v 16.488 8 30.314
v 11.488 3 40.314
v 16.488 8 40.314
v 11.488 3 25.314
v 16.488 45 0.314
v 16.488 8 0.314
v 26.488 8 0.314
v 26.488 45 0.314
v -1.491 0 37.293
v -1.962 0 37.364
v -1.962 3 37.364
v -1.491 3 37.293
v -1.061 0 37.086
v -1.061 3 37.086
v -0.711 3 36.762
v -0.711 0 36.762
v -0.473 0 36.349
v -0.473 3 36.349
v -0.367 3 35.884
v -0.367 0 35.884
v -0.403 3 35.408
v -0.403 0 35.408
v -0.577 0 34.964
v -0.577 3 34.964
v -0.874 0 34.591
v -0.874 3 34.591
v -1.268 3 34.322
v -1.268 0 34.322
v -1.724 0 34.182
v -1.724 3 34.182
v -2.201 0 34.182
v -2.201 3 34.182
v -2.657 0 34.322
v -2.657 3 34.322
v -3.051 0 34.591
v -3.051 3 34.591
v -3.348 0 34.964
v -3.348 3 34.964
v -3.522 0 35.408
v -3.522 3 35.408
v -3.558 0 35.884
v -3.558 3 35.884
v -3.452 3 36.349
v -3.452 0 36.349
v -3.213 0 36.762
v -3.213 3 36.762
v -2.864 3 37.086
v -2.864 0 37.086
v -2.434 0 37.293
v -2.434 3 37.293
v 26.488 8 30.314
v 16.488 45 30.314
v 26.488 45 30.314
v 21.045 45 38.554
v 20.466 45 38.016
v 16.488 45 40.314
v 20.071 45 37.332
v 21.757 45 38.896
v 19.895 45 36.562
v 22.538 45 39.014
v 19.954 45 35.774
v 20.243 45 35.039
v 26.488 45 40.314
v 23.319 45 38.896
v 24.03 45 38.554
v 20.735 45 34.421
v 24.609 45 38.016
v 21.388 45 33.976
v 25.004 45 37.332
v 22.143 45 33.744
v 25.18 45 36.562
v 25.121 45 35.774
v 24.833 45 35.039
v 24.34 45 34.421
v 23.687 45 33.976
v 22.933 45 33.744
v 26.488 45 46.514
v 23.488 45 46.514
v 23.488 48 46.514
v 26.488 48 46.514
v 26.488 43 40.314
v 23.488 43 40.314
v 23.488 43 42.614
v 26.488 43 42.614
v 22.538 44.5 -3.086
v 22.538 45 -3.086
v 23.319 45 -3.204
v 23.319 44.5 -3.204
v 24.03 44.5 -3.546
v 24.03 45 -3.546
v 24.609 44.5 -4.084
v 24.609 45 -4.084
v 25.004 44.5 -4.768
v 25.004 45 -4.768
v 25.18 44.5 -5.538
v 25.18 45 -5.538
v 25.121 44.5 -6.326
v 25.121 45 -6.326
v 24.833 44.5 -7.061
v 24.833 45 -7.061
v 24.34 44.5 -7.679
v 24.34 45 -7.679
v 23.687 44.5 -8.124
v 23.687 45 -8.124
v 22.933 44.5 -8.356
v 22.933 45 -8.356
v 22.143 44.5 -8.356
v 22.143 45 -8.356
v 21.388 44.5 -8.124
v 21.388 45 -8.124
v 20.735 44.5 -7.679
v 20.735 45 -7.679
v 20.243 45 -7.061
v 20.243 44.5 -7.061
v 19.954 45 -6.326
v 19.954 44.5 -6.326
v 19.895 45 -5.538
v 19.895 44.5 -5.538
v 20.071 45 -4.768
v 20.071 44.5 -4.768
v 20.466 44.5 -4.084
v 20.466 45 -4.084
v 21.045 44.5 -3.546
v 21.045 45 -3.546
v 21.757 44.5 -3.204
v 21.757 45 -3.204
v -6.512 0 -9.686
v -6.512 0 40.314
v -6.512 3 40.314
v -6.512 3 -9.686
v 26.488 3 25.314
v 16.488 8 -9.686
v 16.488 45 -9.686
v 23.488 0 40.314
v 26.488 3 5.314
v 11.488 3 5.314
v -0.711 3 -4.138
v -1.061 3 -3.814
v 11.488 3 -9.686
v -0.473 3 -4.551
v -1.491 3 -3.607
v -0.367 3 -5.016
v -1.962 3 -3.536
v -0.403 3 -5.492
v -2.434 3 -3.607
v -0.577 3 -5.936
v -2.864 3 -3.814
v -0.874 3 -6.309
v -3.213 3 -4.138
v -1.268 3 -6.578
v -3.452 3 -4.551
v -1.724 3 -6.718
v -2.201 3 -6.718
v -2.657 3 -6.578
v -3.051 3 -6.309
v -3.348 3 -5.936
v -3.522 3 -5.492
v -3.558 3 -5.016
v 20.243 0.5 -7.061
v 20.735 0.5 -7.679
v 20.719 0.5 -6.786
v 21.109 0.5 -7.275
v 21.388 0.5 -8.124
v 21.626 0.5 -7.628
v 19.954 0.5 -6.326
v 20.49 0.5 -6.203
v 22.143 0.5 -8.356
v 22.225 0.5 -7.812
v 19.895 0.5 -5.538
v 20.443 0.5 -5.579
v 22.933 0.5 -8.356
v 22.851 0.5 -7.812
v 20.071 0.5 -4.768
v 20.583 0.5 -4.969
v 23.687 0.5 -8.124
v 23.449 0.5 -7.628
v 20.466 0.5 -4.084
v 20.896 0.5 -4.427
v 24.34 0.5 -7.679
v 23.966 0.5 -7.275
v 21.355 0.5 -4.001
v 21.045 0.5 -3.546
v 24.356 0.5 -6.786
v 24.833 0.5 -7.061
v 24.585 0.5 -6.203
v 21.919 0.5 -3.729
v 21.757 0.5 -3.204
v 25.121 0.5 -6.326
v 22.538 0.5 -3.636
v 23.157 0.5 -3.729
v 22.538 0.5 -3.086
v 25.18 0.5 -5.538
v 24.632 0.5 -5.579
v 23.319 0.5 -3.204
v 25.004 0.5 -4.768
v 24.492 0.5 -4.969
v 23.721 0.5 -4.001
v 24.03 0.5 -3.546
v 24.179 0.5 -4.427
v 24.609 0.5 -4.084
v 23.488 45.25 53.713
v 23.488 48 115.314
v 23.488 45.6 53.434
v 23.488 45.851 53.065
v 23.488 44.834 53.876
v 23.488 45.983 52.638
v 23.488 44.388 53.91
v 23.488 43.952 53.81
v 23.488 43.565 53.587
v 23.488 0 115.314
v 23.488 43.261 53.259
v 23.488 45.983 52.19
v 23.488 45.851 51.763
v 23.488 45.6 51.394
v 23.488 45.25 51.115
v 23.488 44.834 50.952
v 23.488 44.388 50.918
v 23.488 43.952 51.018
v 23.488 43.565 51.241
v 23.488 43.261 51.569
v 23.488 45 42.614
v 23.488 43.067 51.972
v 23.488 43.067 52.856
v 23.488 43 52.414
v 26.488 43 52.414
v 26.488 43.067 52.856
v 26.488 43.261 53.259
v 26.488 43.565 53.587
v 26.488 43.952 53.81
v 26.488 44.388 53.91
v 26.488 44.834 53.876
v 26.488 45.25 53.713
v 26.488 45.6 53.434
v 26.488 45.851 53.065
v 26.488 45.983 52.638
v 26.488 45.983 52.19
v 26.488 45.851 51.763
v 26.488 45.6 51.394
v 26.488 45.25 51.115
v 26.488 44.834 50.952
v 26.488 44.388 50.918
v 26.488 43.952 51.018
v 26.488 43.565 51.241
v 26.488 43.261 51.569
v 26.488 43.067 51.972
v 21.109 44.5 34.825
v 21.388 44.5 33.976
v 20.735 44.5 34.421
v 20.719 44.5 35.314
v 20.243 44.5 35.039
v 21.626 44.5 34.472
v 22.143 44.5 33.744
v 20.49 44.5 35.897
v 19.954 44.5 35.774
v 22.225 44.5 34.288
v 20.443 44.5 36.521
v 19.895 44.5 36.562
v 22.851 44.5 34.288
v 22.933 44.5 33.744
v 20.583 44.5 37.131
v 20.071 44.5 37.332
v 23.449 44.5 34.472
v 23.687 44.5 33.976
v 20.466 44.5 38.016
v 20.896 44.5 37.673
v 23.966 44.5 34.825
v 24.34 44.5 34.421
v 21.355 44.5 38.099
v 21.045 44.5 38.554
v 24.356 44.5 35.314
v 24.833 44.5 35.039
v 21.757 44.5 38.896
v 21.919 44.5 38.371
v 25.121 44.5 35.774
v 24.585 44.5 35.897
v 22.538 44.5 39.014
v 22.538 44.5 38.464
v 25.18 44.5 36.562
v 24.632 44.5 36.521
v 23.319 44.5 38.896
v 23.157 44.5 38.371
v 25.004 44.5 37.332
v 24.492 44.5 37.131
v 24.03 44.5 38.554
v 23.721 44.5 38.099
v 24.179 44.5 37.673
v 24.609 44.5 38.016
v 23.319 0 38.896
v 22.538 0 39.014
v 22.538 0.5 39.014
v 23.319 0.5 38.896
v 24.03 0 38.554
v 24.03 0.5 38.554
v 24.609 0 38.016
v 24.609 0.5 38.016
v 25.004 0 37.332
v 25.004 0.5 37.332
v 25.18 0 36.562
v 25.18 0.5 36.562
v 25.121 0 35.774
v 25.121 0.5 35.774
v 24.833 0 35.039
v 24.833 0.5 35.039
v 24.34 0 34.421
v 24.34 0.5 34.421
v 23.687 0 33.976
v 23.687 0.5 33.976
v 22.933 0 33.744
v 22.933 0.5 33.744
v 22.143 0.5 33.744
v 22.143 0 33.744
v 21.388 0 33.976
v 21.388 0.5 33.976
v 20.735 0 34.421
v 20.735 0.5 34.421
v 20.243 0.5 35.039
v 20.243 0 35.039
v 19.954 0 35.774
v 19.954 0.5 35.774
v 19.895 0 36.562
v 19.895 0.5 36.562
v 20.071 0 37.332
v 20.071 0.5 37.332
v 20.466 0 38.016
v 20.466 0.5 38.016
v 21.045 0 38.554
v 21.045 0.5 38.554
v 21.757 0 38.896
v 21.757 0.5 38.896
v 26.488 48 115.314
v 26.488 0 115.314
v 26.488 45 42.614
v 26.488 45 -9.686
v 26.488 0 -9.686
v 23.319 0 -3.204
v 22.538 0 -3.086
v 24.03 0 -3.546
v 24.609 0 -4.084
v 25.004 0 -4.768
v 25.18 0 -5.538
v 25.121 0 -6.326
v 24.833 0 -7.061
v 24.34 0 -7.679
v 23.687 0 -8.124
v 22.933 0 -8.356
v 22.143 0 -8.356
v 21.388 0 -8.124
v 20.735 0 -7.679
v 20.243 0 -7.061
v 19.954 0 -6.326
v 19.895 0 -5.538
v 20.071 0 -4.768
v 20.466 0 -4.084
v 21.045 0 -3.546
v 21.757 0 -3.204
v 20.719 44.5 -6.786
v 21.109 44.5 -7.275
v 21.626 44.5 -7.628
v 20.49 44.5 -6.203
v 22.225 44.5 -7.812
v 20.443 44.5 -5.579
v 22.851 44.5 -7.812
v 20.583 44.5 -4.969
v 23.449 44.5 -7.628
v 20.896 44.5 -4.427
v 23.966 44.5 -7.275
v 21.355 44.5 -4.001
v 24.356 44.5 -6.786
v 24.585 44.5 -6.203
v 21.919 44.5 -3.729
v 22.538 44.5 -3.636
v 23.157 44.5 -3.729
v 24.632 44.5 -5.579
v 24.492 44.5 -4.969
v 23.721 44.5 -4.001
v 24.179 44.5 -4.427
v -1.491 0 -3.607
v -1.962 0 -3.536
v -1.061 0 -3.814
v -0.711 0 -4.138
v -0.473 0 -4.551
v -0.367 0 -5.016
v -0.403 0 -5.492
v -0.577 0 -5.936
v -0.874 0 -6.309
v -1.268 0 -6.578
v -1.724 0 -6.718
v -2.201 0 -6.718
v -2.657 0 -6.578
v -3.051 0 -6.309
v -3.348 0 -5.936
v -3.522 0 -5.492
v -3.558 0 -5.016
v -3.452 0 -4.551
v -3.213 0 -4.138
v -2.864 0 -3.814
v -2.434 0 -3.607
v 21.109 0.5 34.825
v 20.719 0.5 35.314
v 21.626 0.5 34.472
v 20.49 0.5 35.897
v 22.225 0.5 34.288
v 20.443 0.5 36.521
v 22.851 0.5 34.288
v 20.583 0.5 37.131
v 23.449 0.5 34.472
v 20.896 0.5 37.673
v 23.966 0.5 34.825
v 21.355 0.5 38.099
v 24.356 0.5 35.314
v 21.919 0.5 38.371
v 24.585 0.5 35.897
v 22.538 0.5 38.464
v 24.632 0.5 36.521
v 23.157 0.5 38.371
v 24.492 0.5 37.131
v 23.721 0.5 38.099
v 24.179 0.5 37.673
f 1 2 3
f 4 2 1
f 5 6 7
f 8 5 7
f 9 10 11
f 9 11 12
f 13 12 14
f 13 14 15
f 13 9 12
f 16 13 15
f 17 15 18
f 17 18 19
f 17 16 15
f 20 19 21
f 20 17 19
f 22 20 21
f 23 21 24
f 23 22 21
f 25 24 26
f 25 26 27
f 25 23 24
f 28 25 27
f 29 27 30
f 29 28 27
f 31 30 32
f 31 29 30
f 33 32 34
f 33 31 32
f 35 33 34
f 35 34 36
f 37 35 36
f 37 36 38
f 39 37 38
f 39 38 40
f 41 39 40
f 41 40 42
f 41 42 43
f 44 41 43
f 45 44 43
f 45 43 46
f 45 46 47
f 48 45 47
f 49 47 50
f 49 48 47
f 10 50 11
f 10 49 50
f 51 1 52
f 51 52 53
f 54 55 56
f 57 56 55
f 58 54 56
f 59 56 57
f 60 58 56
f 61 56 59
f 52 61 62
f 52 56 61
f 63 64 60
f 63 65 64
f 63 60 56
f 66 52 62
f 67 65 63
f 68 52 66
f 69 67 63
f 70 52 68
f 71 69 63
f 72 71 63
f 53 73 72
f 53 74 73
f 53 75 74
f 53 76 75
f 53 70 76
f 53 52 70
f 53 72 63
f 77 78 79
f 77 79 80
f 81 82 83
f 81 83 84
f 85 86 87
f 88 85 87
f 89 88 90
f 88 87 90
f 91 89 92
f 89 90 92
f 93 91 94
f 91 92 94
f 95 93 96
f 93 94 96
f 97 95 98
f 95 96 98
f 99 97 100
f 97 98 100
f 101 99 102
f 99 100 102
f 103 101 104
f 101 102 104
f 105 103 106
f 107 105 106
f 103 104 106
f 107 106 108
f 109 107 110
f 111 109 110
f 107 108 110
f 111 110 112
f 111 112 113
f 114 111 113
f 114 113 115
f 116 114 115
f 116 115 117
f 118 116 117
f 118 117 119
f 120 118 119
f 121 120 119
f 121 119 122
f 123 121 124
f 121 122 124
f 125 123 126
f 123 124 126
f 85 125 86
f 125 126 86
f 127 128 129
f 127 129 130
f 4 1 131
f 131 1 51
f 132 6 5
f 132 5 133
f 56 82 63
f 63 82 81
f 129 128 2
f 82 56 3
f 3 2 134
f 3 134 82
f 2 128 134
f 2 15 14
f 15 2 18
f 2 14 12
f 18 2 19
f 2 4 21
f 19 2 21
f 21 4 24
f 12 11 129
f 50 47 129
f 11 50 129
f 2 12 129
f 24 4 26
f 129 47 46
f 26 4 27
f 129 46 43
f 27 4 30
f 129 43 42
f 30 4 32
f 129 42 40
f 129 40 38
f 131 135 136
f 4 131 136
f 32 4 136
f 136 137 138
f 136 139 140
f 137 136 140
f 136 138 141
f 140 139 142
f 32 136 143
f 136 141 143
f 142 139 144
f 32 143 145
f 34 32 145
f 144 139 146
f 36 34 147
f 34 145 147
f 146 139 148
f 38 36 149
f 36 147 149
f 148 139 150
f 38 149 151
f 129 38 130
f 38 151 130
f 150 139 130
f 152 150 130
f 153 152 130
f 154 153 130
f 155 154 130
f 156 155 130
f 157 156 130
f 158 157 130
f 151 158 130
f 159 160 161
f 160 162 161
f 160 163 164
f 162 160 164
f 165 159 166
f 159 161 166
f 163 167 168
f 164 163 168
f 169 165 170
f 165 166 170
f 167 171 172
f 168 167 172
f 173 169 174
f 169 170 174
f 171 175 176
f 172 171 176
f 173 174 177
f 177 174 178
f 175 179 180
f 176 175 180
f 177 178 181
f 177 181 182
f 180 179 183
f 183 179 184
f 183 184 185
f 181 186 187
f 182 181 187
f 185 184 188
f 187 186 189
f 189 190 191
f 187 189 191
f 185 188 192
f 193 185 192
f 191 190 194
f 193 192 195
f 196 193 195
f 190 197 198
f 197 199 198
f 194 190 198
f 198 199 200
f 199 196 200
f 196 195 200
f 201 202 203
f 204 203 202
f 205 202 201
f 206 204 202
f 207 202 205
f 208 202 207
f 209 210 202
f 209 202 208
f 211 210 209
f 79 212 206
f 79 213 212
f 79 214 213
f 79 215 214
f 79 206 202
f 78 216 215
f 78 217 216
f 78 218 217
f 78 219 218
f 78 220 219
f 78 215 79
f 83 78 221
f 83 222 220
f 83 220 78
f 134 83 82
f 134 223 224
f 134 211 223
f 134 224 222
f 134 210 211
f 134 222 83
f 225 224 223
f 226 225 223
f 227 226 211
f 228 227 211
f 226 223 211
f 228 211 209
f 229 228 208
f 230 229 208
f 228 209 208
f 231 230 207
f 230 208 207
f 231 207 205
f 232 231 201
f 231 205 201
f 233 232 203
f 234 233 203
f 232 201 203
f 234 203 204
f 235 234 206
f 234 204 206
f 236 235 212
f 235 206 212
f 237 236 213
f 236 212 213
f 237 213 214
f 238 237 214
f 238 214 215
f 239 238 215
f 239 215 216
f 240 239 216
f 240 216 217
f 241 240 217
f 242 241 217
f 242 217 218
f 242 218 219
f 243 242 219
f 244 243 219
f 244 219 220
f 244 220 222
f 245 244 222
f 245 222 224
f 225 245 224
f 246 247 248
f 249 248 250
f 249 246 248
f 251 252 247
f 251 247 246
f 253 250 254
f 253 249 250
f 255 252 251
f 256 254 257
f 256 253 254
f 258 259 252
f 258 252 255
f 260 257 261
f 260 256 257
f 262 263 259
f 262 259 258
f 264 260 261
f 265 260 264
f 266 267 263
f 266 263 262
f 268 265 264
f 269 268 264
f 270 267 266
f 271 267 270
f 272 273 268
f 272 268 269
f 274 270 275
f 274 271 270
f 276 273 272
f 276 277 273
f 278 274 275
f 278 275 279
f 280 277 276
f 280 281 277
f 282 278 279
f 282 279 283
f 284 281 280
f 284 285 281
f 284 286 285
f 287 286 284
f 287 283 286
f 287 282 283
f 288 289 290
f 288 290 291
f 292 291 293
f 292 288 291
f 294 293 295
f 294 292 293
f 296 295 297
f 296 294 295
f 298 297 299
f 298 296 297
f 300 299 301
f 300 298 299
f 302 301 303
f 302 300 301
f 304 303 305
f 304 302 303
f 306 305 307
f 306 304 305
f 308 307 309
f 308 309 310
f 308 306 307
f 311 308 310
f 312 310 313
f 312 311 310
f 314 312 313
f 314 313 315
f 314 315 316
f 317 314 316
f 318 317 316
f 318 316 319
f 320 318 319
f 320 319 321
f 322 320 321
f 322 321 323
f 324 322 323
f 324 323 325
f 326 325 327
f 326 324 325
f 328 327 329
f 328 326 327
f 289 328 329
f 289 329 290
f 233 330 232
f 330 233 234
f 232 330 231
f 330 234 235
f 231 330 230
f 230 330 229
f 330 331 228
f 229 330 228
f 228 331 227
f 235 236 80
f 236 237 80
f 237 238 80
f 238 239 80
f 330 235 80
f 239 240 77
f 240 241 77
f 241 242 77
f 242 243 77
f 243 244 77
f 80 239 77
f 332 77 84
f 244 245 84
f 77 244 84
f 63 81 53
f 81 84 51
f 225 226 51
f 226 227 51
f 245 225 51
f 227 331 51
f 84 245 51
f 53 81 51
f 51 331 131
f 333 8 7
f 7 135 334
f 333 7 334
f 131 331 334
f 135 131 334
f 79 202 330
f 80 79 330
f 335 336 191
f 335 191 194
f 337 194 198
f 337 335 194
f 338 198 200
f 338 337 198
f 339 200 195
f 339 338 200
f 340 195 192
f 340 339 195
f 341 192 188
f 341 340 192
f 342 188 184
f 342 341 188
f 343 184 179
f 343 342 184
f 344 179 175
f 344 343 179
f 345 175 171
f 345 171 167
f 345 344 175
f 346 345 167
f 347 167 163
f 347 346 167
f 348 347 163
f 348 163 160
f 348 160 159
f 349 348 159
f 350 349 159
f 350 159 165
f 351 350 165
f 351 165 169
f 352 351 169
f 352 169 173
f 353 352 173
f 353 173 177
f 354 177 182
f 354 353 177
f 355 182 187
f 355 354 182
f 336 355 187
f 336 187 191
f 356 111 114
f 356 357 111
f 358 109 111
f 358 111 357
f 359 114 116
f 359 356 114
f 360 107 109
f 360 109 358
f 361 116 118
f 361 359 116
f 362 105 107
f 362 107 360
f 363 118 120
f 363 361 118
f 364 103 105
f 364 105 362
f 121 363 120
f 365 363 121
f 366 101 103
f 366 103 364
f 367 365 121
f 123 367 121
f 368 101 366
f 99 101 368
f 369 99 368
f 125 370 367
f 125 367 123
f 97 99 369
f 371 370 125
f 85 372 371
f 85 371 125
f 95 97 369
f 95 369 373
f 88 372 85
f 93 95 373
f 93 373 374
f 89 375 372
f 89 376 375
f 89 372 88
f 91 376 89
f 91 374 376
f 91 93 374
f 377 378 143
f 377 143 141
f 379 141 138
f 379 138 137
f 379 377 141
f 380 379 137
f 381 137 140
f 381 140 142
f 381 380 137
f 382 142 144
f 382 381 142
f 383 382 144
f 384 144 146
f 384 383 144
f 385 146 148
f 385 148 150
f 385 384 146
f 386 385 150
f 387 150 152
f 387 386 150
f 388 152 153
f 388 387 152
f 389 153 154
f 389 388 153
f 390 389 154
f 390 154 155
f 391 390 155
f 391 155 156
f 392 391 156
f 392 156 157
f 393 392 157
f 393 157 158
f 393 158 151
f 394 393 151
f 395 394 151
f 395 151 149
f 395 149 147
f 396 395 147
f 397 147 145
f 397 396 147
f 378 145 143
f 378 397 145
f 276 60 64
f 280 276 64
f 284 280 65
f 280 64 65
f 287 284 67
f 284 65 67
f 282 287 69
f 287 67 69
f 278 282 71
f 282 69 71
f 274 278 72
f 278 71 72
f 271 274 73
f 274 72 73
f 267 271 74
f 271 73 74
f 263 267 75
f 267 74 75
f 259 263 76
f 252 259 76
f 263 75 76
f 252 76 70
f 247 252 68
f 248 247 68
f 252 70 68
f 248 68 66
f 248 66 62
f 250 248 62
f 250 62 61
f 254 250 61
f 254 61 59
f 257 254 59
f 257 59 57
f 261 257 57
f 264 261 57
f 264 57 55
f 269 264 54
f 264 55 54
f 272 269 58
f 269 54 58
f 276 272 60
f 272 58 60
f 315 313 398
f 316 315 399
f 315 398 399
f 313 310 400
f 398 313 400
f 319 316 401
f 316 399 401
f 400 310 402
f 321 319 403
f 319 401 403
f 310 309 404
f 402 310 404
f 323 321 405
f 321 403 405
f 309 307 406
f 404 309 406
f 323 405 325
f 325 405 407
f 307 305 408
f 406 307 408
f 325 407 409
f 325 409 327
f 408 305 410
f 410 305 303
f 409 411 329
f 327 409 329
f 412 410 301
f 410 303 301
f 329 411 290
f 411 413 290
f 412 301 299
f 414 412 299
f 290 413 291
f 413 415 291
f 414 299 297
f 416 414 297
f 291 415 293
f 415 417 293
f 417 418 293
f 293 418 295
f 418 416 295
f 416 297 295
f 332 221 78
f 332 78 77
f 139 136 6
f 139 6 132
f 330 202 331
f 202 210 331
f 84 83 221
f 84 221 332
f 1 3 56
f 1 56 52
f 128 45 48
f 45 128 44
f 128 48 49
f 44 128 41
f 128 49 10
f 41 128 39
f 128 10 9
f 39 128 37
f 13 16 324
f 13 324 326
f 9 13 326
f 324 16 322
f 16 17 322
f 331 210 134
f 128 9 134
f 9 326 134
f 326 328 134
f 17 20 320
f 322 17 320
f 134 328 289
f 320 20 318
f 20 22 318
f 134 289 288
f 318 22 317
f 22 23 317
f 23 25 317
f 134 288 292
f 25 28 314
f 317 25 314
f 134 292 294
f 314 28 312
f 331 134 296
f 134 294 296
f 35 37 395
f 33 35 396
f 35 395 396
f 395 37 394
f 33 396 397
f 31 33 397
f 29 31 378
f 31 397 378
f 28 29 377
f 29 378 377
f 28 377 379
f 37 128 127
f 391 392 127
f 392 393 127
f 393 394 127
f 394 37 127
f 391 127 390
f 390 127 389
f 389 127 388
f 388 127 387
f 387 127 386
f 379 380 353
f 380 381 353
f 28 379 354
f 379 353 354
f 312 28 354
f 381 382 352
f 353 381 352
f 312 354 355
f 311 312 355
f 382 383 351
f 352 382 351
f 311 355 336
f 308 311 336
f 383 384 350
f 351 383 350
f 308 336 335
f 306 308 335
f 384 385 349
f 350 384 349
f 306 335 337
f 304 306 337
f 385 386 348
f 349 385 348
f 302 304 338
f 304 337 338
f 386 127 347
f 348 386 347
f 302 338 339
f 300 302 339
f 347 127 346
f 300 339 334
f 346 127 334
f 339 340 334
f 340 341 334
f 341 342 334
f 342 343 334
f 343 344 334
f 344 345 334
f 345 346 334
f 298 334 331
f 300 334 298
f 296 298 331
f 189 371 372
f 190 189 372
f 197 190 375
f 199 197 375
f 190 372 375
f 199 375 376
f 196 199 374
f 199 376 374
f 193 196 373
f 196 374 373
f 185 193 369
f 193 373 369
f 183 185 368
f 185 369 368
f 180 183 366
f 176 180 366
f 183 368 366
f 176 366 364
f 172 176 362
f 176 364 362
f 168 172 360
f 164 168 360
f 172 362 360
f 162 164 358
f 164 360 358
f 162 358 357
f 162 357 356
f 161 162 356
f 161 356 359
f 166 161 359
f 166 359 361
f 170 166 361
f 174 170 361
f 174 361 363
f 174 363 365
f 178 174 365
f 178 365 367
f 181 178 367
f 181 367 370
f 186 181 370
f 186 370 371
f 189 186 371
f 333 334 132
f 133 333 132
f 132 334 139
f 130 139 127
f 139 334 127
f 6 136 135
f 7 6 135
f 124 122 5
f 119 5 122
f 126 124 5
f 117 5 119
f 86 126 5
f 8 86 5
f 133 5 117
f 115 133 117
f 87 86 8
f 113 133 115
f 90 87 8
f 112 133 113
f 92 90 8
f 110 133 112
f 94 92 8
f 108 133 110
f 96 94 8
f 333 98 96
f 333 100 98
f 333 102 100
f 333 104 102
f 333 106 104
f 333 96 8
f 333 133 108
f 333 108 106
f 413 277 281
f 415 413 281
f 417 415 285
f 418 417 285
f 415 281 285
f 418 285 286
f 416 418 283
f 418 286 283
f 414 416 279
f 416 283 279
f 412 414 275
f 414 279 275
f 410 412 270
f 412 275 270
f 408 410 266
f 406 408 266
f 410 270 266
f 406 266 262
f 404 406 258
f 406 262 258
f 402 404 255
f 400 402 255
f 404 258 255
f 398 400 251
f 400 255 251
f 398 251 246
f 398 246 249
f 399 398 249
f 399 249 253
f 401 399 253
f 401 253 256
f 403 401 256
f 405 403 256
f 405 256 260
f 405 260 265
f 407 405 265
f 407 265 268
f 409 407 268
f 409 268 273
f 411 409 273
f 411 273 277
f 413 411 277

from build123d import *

# Parameters (mm, degrees)
SKETCH1_R           = 1.6
BOSS_EXTRUDE1_DEPTH = 3
SKETCH2_W           = 10
SKETCH2_H           = 10
BOSS_EXTRUDE2_DEPTH = 42
CHAMFER1_SIZE       = 5
SKETCH3_R           = 2.1
CUT_EXTRUDE1_DEPTH  = 52
SKETCH4_R           = 2.65
CUT_EXTRUDE2_DEPTH  = 0.5
SKETCH5_W           = 3
SKETCH5_H           = 43
BOSS_EXTRUDE3_DEPTH = 75
SKETCH6_W           = 3
SKETCH6_H           = 3.9
BOSS_EXTRUDE4_DEPTH = 2
SKETCH7_W           = 3
SKETCH7_H           = 68.8
BOSS_EXTRUDE5_DEPTH = 5
SKETCH8_R           = 1.5
CUT_EXTRUDE3_DEPTH  = 5


with BuildPart() as part:
    # Sketch1 → Boss-Extrude1 (new body)
    with BuildSketch(Plane(origin=(0, 0, 0), x_dir=(1, 0, 0), z_dir=(0, 1, 0))):
        Polygon((-6.512396694, 9.685950413), (1.487603306, 9.685950413), (26.487603306, 9.685950413), (26.487603306, -40.314049587), (1.487603306, -40.314049587), (-6.512396694, -40.314049587), align=None)
        with Locations(Location((-1.962396694, -35.764049587, 0), (0, 0, 270))):
            Circle(SKETCH1_R, mode=Mode.SUBTRACT)
        with Locations(Location((-1.962396694, 5.135950413, 0), (0, 0, 270))):
            Circle(SKETCH1_R, mode=Mode.SUBTRACT)
    extrude(amount=BOSS_EXTRUDE1_DEPTH)

    # Sketch2 → Boss-Extrude2 (add)
    with BuildSketch(Plane(origin=(0, 3, 0), x_dir=(1, 0, 0), z_dir=(0, 1, 0))):
        with Locations((21.487603306, -35.314049587)):
            Rectangle(SKETCH2_W, SKETCH2_H)
        with Locations((21.487603306, 4.685950413)):
            Rectangle(SKETCH2_W, SKETCH2_H)
    extrude(amount=BOSS_EXTRUDE2_DEPTH)

    # Chamfer1
    chamfer1_edges = [part.edges().sort_by_distance(p)[0] for p in [
        (21.487603306, 3, 30.314049587),
        (16.487603306, 3, 35.314049587),
        (16.487603306, 3, -4.685950413),
        (21.487603306, 3, 0.314049587),
    ]]
    chamfer(chamfer1_edges, length=CHAMFER1_SIZE)

    # Sketch3 → Cut-Extrude1 (cut)
    with BuildSketch(Plane(origin=(0, 45, 0), x_dir=(1, 0, 0), z_dir=(0, 1, 0))):
        with Locations(Location((22.537603306, -36.364049587, 0), (0, 0, 270))):
            Circle(SKETCH3_R)
        with Locations(Location((22.537603306, 5.735950413, 0), (0, 0, 270))):
            Circle(SKETCH3_R)
    extrude(amount=-CUT_EXTRUDE1_DEPTH, mode=Mode.SUBTRACT)

    # Sketch4 → Cut-Extrude2 (cut)
    with BuildSketch(Plane(origin=(0, 45, 0), x_dir=(1, 0, 0), z_dir=(0, 1, 0))):
        with Locations(Location((22.537603306, -36.364049587, 0), (0, 0, 270))):
            Circle(SKETCH4_R)
        with Locations(Location((22.537603306, 5.735950413, 0), (0, 0, 270))):
            Circle(SKETCH4_R)
    cut_extrude2 = extrude(amount=-CUT_EXTRUDE2_DEPTH, mode=Mode.SUBTRACT)

    # Mirror1: Cut-Extrude2 across plane
    add(cut_extrude2.mirror(Plane(origin=(0, 22.5, 0), x_dir=(0, 0, 1), z_dir=(0, -1, 0))), mode=Mode.SUBTRACT)

    # Sketch5 → Boss-Extrude3 (add)
    with BuildSketch(Plane.XY.offset(40.314049587)):
        with Locations((24.987603306, 21.5)):
            Rectangle(SKETCH5_W, SKETCH5_H)
    extrude(amount=BOSS_EXTRUDE3_DEPTH)

    # Sketch6 → Boss-Extrude4 (add)
    with BuildSketch(Plane(origin=(0, 43, 0), x_dir=(1, 0, 0), z_dir=(0, 1, 0))):
        with Locations((24.987603306, -44.564049587)):
            Rectangle(SKETCH6_W, SKETCH6_H)
    extrude(amount=BOSS_EXTRUDE4_DEPTH)

    # Sketch7 → Boss-Extrude5 (add)
    with BuildSketch(Plane(origin=(0, 43, 0), x_dir=(1, 0, 0), z_dir=(0, 1, 0))):
        with Locations((24.987603306, -80.914049587)):
            Rectangle(SKETCH7_W, SKETCH7_H)
    extrude(amount=BOSS_EXTRUDE5_DEPTH)

    # Sketch8 → Cut-Extrude3 (cut)
    with BuildSketch(Plane.ZY.offset(-23.487603306)):
        with Locations(Location((52.414049587, 44.5, 0), (0, 0, 270))):
            Circle(SKETCH8_R)
    extrude(amount=-CUT_EXTRUDE3_DEPTH, mode=Mode.SUBTRACT)


solid = part.part
